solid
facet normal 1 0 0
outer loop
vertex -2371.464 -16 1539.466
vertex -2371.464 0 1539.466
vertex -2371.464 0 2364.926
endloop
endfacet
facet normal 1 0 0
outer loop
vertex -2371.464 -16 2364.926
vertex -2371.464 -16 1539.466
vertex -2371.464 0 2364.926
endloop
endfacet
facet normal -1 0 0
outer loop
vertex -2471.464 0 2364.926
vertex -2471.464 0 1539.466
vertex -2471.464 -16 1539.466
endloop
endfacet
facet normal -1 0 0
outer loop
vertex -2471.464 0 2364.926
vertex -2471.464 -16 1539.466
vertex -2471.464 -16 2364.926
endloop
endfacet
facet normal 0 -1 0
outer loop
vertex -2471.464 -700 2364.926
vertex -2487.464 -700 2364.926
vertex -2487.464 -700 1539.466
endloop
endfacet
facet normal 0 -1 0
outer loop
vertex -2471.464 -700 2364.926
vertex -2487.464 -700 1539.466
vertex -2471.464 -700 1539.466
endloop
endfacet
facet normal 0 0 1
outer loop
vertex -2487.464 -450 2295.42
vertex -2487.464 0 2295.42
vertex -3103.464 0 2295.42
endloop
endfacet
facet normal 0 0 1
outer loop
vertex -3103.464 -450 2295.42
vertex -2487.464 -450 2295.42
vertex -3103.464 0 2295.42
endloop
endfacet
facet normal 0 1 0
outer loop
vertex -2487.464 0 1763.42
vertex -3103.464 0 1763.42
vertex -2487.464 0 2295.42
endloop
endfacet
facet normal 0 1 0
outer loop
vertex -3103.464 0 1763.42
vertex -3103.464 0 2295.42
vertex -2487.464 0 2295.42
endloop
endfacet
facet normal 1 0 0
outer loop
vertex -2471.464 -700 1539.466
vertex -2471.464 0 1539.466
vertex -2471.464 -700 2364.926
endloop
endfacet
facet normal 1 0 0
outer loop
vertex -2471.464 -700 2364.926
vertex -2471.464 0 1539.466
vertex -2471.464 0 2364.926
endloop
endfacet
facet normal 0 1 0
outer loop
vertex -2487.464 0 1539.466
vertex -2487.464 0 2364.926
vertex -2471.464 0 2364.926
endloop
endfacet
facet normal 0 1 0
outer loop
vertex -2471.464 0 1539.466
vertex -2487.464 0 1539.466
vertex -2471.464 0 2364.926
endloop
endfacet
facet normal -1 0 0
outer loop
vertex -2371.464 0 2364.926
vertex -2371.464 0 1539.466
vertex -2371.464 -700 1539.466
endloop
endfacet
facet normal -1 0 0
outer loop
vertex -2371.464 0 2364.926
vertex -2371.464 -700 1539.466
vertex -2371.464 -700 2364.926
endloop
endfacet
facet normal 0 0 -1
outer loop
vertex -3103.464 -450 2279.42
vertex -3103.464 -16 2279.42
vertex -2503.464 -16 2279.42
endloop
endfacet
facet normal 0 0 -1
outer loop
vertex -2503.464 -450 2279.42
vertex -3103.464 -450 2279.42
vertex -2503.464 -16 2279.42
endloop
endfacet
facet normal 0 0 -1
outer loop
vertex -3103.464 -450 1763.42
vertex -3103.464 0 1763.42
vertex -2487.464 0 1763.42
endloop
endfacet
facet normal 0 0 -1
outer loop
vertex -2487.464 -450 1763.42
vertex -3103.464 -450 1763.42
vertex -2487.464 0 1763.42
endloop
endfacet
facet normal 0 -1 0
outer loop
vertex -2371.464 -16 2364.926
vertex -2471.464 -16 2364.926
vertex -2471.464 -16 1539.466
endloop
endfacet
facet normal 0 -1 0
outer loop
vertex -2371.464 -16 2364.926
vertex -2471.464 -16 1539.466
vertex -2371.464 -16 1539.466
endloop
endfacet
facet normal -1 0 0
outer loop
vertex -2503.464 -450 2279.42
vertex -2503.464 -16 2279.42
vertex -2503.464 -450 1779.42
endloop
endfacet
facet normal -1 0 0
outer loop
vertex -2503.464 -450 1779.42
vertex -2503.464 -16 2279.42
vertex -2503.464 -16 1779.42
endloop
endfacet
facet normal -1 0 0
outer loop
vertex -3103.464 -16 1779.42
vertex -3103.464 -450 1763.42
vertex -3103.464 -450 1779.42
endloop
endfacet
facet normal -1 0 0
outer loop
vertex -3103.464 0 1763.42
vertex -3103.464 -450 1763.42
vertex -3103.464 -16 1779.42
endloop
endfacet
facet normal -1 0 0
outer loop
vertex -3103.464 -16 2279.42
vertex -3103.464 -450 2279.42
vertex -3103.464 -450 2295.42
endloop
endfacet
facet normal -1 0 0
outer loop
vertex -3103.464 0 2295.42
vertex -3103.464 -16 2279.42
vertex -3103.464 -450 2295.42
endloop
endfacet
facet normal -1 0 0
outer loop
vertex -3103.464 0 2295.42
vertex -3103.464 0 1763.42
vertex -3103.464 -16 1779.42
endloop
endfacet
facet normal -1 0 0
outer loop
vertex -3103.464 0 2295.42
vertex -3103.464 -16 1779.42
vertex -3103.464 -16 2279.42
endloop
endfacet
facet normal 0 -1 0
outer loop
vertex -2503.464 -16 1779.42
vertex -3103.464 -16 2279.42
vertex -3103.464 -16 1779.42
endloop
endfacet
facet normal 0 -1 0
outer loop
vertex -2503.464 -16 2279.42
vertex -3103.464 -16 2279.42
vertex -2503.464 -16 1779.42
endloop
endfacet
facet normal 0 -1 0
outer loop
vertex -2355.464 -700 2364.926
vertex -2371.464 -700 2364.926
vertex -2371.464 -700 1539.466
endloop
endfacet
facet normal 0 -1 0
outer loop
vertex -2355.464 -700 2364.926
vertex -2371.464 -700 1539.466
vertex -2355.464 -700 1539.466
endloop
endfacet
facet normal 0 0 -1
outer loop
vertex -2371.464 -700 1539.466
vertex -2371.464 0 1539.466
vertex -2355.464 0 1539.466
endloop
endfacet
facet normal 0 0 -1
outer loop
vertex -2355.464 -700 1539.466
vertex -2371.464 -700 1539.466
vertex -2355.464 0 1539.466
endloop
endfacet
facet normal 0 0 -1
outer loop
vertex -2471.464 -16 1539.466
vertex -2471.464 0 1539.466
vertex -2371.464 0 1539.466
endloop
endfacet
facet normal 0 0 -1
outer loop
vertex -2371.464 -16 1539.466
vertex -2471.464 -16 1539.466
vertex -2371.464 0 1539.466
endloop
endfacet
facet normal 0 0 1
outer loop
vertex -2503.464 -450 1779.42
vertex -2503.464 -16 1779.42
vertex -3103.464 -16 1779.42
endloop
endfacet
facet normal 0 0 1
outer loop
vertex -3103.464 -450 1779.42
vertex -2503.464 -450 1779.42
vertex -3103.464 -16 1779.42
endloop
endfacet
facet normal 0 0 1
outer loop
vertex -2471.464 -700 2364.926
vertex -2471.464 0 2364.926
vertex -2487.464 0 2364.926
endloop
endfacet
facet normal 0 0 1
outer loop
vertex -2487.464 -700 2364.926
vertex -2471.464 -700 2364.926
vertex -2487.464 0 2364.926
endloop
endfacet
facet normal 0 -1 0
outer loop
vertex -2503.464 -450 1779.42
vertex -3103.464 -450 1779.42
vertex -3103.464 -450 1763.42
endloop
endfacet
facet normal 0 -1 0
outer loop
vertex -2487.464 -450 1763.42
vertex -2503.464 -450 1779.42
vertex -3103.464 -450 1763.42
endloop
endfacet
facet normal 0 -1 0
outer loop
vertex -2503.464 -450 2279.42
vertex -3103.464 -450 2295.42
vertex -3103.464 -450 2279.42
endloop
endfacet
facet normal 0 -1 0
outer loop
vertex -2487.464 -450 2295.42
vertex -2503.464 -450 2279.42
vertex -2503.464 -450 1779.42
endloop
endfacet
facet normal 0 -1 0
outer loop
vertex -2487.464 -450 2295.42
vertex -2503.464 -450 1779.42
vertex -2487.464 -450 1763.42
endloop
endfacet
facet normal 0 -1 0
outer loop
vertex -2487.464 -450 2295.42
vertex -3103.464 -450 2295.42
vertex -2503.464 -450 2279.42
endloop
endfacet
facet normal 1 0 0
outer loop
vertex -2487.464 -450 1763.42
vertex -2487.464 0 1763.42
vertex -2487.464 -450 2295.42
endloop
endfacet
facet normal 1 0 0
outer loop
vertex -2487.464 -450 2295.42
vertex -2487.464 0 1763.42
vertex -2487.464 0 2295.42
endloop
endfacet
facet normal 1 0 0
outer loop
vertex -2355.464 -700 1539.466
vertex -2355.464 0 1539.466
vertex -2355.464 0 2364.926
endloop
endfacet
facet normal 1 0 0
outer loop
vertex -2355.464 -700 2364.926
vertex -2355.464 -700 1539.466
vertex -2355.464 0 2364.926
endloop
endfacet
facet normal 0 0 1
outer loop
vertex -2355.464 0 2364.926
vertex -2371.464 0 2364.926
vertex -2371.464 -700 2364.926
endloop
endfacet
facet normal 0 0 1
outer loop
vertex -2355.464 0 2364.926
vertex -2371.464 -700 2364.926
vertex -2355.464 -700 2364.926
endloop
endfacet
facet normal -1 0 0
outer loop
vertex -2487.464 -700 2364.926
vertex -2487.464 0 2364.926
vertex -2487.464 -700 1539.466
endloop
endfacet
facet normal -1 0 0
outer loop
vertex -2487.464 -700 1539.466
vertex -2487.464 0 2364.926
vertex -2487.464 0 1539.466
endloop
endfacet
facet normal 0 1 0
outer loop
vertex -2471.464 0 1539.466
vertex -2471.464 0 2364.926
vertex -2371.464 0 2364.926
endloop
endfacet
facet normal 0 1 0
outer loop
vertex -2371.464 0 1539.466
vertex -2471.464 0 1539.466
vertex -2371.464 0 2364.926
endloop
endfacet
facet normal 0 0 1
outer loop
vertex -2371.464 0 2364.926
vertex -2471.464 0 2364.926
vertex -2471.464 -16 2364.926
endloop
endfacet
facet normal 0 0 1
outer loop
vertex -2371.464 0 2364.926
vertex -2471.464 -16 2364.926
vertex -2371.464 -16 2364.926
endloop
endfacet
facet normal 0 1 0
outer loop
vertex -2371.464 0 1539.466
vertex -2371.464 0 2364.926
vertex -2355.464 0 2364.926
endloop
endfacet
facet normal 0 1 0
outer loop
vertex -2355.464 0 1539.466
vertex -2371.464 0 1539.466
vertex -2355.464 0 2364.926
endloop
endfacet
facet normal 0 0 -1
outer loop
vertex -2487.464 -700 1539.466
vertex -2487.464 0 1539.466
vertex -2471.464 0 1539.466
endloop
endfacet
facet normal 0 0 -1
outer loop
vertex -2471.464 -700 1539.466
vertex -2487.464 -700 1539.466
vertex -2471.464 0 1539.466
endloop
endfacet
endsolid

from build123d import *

# Parameters (mm, degrees)
F1_DEPTH = 450
F0_W     = 600
F0_H     = 500
F2_DEPTH = 16
F0_W_2   = 16
F0_H_2   = 825.460493
F3_DEPTH = 700
F0_W_3   = 100
F4_DEPTH = 16


with BuildPart() as f1:
    # F0 (on Front) → F1 (new body)
    with BuildSketch(Plane.XZ):
        Polygon((-3103.463992, 2295.420257), (-3103.463992, 2279.420257), (-2503.463992, 2279.420257), (-2503.463992, 1779.420257), (-3103.463992, 1779.420257), (-3103.463992, 1763.420257), (-2487.463992, 1763.420257), (-2487.463992, 2295.420257), align=None)
    extrude(amount=F1_DEPTH)

    # F0 (on Front) → F2 (join)
    with BuildSketch(Plane.XZ):
        with Locations((-2803.463992, 2029.420257)):
            Rectangle(F0_W, F0_H)
    extrude(amount=F2_DEPTH)


with BuildPart() as f3:
    # F0 (on Front) → F3 (new body)
    with BuildSketch(Plane.XZ):
        Polygon((-2487.463992, 2364.92604), (-2487.463992, 2295.420257), (-2487.463992, 1763.420257), (-2487.463992, 1539.465547), (-2471.463992, 1539.465547), (-2471.463992, 2364.92604), align=None)
        with Locations((-2363.463992, 1952.195794)):
            Rectangle(F0_W_2, F0_H_2)
    extrude(amount=F3_DEPTH)


with BuildPart() as f4:
    # F0 (on Front) → F4 (new body)
    with BuildSketch(Plane.XZ):
        with Locations((-2421.463992, 1952.195794)):
            Rectangle(F0_W_3, F0_H_2)
    extrude(amount=F4_DEPTH)


solid = Compound([f1.part, f3.part, f4.part])
